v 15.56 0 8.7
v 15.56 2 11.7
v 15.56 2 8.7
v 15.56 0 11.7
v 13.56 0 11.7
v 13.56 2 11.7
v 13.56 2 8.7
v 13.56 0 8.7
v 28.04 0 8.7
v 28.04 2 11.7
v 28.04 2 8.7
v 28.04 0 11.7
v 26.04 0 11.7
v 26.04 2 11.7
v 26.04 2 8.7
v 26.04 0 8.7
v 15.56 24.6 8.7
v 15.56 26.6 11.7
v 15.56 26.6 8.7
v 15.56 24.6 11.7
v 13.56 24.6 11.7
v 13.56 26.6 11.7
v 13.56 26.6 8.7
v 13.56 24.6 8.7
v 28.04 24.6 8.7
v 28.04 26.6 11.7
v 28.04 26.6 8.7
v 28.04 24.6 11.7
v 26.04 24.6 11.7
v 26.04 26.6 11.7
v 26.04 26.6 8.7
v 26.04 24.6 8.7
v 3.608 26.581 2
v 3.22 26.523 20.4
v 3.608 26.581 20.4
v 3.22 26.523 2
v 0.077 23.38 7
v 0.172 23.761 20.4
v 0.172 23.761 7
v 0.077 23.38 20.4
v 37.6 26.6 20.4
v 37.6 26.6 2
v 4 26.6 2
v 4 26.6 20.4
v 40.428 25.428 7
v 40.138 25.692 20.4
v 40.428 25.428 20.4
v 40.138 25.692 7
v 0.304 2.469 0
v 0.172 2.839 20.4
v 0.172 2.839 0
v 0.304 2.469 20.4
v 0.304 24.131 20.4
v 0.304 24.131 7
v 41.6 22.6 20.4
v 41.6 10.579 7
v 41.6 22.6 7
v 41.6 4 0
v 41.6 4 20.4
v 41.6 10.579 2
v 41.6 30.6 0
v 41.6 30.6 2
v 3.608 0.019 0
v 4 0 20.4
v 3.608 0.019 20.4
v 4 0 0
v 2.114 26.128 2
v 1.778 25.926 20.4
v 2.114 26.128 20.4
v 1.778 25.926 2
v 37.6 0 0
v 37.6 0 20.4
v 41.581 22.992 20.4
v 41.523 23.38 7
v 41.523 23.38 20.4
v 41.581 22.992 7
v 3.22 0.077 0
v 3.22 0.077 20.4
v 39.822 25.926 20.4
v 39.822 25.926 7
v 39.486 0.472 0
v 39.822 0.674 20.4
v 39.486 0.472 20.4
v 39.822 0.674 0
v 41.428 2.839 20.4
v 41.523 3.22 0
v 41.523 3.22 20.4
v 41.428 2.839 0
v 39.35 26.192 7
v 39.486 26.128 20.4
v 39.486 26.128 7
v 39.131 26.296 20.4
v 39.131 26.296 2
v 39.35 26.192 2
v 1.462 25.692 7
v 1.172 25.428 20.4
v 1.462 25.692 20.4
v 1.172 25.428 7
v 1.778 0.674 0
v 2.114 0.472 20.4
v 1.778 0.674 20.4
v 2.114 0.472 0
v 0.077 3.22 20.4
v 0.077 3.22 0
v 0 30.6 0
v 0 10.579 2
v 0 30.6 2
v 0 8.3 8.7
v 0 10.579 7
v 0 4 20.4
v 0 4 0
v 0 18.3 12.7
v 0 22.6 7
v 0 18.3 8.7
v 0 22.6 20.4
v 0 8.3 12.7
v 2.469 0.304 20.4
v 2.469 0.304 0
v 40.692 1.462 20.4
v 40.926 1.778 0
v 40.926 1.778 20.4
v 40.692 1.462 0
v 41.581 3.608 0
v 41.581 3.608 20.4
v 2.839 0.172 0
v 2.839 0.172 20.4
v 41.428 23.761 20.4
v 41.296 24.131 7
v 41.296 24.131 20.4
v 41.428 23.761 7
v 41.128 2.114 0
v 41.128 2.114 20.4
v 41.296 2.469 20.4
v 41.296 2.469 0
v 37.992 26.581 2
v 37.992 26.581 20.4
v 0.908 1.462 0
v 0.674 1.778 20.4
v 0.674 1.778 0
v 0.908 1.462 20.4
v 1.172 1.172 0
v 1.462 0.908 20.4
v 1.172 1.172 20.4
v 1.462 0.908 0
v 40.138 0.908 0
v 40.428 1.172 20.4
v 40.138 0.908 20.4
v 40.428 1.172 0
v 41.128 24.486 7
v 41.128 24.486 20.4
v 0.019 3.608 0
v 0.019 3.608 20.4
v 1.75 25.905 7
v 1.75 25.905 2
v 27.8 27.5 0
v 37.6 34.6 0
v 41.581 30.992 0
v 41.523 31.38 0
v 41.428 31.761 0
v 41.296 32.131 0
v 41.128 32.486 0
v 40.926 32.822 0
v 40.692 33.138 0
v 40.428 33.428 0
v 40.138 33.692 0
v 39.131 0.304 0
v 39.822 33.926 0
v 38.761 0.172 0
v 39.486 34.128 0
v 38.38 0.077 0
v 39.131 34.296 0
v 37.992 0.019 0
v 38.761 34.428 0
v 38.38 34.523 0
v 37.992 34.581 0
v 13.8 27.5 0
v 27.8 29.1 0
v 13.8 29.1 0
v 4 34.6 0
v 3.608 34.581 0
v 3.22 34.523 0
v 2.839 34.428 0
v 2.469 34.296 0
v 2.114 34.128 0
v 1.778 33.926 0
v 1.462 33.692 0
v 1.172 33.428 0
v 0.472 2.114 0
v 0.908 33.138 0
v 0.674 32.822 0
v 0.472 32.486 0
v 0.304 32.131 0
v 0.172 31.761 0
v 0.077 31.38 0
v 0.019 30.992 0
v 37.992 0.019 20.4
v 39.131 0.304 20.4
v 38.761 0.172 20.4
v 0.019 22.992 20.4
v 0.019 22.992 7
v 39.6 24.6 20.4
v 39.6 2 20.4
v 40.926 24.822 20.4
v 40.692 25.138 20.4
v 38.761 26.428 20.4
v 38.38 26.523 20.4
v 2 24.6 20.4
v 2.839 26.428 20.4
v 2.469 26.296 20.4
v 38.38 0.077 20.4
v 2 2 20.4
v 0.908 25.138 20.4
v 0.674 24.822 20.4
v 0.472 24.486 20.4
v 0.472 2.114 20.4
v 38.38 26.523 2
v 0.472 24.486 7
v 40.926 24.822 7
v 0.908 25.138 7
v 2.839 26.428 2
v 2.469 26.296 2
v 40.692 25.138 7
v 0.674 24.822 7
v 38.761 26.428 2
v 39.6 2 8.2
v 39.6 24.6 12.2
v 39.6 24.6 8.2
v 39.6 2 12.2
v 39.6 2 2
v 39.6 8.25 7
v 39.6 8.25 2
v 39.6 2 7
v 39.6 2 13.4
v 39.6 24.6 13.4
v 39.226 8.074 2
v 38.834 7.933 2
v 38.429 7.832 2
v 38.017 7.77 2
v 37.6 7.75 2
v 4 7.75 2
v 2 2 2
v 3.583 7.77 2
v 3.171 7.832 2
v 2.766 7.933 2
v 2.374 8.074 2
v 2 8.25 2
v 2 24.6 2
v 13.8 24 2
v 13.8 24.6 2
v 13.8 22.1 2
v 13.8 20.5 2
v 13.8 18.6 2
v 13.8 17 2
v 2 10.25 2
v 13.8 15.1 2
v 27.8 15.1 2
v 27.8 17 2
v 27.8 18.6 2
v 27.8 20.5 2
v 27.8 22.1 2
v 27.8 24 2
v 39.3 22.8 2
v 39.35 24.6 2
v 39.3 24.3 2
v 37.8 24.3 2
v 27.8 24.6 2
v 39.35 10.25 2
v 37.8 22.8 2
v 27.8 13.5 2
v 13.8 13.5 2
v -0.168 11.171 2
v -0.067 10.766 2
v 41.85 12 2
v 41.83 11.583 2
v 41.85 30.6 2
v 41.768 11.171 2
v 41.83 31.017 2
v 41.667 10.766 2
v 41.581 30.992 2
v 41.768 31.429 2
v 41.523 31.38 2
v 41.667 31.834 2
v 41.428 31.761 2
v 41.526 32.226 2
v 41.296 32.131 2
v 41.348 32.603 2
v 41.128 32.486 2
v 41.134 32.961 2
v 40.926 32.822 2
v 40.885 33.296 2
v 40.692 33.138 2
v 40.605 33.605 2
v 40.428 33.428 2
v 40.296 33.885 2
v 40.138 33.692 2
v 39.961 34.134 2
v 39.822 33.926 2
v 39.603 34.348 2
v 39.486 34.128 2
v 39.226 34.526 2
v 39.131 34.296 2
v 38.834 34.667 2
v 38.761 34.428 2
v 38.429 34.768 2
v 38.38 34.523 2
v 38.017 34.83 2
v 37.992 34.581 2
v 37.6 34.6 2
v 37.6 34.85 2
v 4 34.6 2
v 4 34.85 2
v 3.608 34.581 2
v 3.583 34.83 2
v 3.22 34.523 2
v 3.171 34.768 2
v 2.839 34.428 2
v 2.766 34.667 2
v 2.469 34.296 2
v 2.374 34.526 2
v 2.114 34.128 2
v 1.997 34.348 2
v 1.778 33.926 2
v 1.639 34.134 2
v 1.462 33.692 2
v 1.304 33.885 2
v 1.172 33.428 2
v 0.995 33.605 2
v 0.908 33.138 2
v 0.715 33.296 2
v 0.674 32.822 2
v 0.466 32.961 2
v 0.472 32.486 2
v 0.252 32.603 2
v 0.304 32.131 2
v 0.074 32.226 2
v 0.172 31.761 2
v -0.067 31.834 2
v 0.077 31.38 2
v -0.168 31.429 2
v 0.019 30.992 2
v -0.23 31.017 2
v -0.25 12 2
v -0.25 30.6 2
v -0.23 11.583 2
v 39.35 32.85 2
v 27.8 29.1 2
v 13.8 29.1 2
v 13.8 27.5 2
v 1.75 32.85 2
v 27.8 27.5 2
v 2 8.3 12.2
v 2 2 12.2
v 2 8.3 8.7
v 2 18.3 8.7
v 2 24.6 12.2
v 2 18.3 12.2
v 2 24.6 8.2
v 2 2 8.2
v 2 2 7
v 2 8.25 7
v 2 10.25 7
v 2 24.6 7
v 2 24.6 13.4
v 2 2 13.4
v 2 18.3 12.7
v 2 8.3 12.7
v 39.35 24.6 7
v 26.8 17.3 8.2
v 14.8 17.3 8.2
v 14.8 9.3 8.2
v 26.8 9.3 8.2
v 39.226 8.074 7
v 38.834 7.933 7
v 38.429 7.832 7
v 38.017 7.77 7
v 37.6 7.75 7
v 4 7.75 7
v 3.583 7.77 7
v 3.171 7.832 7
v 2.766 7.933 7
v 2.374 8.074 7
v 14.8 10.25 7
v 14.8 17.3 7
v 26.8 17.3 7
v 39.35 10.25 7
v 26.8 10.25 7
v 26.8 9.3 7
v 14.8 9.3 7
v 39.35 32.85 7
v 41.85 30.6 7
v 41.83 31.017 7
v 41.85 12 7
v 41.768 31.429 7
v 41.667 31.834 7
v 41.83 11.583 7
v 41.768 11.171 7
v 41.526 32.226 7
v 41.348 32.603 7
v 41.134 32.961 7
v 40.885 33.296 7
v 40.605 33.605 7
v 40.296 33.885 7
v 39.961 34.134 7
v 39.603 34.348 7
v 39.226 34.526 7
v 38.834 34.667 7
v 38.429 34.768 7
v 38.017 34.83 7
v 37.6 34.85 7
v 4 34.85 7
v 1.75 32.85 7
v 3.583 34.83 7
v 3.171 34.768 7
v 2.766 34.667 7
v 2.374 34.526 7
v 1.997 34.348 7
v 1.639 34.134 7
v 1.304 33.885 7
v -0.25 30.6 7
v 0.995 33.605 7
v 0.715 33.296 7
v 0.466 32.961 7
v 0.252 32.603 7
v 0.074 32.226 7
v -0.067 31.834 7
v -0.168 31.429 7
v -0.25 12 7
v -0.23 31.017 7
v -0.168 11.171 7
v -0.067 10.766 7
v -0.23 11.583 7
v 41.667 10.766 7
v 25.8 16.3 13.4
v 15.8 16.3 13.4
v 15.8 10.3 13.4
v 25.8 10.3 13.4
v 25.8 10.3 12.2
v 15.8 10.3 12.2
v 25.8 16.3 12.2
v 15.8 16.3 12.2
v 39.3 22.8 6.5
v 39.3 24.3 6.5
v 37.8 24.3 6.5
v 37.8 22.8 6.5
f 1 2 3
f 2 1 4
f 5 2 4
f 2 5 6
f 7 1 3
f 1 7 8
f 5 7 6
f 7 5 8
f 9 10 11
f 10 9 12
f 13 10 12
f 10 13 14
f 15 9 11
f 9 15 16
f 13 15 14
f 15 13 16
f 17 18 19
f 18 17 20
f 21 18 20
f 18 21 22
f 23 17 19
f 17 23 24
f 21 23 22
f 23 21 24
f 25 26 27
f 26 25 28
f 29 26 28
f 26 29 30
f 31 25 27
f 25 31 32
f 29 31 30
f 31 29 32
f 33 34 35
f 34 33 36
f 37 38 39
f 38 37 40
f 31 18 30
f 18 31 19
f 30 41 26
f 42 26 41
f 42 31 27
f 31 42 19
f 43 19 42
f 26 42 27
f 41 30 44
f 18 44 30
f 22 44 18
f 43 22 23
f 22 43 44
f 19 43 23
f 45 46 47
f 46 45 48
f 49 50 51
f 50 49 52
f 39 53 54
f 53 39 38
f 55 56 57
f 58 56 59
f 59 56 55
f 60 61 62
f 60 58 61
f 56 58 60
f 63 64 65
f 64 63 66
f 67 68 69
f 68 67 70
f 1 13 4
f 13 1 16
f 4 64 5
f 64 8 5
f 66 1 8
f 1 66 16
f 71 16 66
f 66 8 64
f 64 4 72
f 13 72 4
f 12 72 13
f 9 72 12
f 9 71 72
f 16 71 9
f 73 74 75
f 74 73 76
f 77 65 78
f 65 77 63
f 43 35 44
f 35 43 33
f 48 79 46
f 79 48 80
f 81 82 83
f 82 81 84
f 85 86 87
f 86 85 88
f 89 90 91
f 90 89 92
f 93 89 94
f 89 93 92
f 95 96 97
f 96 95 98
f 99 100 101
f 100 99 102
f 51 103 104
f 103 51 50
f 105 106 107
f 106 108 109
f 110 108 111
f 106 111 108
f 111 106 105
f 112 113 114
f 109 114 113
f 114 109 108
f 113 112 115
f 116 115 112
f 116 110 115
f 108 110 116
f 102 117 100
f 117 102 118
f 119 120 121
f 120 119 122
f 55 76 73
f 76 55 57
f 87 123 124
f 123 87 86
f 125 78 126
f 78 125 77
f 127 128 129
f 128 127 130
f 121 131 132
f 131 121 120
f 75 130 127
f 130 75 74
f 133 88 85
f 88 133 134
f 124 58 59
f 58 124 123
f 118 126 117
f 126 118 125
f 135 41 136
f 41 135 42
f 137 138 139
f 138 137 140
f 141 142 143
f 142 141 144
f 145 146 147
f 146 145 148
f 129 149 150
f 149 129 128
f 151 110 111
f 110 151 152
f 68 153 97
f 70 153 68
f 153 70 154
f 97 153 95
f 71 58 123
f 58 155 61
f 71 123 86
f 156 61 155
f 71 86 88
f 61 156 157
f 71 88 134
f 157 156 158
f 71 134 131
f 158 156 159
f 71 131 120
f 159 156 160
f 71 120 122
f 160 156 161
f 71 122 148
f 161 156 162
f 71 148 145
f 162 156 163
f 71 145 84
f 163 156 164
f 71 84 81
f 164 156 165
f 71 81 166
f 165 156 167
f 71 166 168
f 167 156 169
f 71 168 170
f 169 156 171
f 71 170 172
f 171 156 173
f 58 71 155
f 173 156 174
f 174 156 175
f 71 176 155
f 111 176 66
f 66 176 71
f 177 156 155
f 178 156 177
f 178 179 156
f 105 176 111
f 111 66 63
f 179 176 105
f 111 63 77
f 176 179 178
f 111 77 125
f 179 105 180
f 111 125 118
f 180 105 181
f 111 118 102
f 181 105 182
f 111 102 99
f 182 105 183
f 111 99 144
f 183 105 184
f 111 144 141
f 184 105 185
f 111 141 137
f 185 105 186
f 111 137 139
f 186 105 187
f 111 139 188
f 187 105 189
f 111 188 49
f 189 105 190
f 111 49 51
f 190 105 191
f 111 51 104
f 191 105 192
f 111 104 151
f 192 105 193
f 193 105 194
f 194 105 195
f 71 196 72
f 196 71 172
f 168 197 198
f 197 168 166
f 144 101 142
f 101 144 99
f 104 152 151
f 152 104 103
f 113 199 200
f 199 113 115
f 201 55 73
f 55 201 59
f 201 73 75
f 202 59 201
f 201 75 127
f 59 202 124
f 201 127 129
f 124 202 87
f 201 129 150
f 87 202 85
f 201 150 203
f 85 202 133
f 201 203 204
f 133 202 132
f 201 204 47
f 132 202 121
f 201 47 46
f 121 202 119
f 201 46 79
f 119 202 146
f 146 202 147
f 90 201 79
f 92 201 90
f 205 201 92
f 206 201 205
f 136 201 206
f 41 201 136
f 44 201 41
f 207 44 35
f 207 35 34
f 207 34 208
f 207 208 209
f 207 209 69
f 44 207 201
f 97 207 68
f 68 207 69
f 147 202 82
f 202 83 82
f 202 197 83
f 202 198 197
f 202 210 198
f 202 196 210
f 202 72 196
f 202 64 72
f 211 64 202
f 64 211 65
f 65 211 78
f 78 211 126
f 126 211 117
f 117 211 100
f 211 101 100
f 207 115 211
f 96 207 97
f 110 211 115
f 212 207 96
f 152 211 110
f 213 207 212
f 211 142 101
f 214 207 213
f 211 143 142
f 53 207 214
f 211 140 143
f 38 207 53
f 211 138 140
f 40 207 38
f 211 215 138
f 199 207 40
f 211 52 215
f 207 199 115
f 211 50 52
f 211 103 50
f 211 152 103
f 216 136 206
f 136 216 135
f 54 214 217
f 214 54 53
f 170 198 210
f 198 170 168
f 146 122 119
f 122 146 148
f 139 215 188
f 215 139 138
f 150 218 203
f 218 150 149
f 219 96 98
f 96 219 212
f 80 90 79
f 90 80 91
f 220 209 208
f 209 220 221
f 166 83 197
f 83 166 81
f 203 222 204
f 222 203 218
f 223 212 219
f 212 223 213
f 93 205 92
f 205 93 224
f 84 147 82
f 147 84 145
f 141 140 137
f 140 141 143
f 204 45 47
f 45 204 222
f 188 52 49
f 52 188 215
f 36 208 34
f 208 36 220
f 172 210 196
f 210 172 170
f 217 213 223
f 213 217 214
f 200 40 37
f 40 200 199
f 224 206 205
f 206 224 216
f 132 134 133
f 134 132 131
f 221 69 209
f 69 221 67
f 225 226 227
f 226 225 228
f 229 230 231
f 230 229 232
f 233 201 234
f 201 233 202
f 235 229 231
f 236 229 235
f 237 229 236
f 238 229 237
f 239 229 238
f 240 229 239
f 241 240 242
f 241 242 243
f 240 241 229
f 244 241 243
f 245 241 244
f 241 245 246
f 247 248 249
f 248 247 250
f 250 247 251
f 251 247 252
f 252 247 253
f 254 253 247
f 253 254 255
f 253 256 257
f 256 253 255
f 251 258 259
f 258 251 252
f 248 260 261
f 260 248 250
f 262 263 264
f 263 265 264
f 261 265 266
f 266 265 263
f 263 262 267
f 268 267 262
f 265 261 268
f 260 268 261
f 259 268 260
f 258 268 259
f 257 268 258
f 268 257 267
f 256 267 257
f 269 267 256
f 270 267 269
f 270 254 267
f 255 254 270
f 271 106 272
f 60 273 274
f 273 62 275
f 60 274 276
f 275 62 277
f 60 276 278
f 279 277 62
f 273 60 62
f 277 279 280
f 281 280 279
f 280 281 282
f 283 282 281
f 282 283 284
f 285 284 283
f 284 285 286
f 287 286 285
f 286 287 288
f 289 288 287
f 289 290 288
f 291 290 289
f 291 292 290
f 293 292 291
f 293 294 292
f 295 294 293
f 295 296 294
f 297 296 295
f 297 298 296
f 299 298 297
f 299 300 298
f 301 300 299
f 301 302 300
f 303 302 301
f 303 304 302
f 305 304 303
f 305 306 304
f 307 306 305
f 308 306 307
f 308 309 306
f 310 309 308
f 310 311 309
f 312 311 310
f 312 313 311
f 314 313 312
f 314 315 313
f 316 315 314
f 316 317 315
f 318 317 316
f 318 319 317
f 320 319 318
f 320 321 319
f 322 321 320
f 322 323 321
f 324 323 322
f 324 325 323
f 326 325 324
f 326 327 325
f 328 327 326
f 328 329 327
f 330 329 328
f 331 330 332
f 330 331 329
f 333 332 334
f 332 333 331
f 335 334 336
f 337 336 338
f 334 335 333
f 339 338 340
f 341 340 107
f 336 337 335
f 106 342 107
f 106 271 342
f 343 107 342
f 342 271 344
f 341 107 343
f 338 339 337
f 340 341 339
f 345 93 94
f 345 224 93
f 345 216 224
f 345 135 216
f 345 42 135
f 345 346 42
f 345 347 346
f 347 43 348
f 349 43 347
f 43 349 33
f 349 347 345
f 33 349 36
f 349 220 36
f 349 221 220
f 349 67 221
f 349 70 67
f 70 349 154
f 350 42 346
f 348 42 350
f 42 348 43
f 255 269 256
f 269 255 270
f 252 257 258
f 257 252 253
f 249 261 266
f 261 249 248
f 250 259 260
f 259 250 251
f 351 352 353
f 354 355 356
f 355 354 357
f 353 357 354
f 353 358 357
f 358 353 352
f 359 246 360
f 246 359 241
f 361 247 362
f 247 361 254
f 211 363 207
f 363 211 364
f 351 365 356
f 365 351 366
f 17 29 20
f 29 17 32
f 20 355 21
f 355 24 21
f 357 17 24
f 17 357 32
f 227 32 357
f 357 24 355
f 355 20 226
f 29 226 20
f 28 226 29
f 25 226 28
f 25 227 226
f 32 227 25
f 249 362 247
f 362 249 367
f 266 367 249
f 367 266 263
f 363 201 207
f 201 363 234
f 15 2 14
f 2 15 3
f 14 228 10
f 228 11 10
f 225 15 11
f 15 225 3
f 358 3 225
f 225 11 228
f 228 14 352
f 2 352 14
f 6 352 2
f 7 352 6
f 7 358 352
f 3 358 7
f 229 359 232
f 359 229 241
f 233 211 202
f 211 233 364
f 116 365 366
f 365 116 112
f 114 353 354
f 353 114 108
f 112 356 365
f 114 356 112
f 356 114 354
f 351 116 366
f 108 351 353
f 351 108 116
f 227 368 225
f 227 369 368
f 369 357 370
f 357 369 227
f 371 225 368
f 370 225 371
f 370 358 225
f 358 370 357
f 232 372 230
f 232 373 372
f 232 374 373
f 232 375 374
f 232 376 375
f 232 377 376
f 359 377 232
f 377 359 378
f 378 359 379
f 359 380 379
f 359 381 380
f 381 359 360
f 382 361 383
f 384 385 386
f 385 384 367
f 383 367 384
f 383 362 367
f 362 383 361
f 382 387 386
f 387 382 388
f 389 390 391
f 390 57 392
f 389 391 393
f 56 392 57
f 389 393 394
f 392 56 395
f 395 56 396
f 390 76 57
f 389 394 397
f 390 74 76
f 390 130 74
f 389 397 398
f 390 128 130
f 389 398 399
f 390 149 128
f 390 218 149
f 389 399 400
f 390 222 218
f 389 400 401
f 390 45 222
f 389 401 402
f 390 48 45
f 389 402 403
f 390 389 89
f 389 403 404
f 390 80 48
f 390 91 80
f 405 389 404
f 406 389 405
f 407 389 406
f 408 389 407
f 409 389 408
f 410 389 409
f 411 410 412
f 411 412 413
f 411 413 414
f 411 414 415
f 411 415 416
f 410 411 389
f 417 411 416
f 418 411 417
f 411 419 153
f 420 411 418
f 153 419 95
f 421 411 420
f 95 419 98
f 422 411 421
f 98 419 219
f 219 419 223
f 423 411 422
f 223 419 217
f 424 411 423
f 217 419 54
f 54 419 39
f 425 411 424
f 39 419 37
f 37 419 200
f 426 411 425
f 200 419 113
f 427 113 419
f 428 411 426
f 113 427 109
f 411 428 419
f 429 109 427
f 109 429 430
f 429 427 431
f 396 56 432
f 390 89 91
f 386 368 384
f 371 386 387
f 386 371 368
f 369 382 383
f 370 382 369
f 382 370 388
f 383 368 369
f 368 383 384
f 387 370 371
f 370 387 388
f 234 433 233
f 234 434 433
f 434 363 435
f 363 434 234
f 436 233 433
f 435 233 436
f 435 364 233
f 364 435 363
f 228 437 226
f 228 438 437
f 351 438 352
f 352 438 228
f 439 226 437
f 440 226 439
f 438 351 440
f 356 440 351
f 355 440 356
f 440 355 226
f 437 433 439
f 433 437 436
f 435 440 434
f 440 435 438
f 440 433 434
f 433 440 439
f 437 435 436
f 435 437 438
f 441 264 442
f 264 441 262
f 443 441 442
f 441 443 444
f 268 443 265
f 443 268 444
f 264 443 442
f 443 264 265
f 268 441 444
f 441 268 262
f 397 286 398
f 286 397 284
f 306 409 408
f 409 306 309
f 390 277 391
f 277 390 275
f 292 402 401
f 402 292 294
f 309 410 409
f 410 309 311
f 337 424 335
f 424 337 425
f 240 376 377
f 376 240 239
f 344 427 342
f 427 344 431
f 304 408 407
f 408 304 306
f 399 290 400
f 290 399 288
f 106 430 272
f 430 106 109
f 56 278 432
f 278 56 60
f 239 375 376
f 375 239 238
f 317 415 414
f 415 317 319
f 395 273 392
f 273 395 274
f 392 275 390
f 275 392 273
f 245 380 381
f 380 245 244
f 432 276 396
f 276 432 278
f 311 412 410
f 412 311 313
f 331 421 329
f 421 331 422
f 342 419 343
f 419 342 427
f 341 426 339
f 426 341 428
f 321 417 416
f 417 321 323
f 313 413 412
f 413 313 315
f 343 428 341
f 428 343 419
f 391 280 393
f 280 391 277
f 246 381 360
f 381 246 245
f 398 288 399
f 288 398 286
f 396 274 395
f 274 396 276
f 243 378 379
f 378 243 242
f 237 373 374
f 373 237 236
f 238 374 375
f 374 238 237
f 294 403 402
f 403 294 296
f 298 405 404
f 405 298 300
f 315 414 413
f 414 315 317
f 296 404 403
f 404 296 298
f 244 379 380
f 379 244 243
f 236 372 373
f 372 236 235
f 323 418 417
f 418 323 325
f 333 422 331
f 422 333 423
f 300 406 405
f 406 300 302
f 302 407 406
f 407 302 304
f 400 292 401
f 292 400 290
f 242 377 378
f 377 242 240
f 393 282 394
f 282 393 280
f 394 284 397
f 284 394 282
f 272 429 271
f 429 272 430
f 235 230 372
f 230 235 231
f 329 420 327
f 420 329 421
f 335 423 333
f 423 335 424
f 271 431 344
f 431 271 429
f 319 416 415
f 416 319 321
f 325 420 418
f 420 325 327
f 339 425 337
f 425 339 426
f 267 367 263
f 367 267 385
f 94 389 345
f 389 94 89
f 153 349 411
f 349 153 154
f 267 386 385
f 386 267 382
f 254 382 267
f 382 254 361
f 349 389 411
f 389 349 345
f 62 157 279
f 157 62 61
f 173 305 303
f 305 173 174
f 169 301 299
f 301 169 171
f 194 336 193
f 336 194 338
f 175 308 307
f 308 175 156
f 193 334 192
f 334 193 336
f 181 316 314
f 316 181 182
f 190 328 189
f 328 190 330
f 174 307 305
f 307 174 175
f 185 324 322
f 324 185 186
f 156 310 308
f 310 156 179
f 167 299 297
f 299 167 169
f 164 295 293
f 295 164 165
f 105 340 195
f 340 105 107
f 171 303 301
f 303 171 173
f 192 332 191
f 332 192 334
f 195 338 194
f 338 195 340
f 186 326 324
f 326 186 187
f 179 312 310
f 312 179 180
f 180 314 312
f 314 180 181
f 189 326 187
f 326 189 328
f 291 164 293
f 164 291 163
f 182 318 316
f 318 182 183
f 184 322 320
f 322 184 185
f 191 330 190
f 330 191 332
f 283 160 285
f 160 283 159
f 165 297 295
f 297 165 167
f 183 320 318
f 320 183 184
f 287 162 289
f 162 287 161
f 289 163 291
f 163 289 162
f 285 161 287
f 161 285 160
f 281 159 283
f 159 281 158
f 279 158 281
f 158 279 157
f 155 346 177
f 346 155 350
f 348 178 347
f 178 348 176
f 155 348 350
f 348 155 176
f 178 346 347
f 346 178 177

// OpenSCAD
/*
 * Zigbee CO2 Sensor Enclosure
 * ───────────────────────────────────────────────────────────────────────────
 * Components (L × W × H):
 *   LiPo 502035p        : 35.0 × 20.0 × 5.0 mm  — bottom layer
 *   ESP32-C6 SuperMini  : 26.15 × 17.5 × 4.0 mm  — middle layer (USB-C on short end)
 *   SCD-41 breakout     : 21.6 × 13.4 × 5.0 mm  — top layer (ventilated lid)
 *
 * Stacking (Z, bottom → top):
 *   wall(2) / LiPo(5) / shelf(1.2) / ESP(4) / shelf(1.2) / SCD41(5) / clearance(2) / lid
 *
 * USB-C port faces the FRONT wall (short face of the enclosure).
 * SCD-41 ventilation slots are in the lid top plate.
 *
 * How to print:
 *   1. Open in OpenSCAD (openscad.org, free)
 *   2. F6 → Render, then File → Export → STL
 *   3. Print BODY and LID separately (no supports needed — both lay flat)
 *   4. Adjust TOL if fit is too tight / too loose
 *
 * Coordinate convention:
 *   X — along enclosure LENGTH  (LiPo long axis, ~42 mm)
 *   Y — along enclosure WIDTH   (LiPo short axis, ~26 mm)
 *   Z — vertical (height,       ~21 mm)
 *   Front face (USB-C cutout) is at X = 0.
 */

$fn = 64;

// ═══════════════════════════════════════════════════════
//  PARAMETERS — tweak these to adjust the model
// ═══════════════════════════════════════════════════════

WALL      = 2.0;    // wall thickness (mm)
R_OUTER   = 4.0;   // outer corner radius — controls how "rounded" corners look
TOL       = 0.3;   // clearance added around each component (per side)

// LiPo battery
BAT_L = 35.0;  BAT_W = 20.0;  BAT_H = 5.0;

// ESP32-C6 SuperMini
ESP_L = 26.15; ESP_W = 17.5;  ESP_H = 4.0;
USB_C_EXT = 1.35;  // how far USB-C plug extends beyond PCB edge

// SCD-41 breakout module
SCD_L = 21.6;  SCD_W = 13.4;  SCD_H = 5.0;

// Internal shelves between layers
SHELF_H = 1.2;

// Air gap above SCD-41 before lid seals
TOP_CLR = 2.0;

// USB-C port cutout size
USB_CUT_W = 10.0;   // width of opening
USB_CUT_H =  4.0;   // height of opening

// Lid parameters
LID_TOP_T   = 2.0;  // lid top plate thickness
LID_RIM_H   = 5.0;  // rim height (overlaps outside of body)
LID_FIT     = 0.25; // clearance between lid rim inner and body outer (per side)

// Ventilation grid in lid (over SCD-41)
VENT_SLOT_L = 14.0;
VENT_SLOT_W =  1.6;
VENT_SLOTS  =  5;
VENT_PITCH  =  3.5;

// ═══════════════════════════════════════════════════════
//  DERIVED DIMENSIONS (do not edit unless you know why)
// ═══════════════════════════════════════════════════════

// Inner cavity — large enough for every component + tolerance
IN_L = max(BAT_L, ESP_L, SCD_L) + 2*TOL + 2.0;   // ~37.6 mm
IN_W = max(BAT_W, ESP_W, SCD_W) + 2*TOL + 2.0;   // ~22.6 mm
IN_H = BAT_H + SHELF_H + ESP_H + SHELF_H + SCD_H + TOP_CLR; // ~18.4 mm

// Body outer
BODY_L = IN_L + 2*WALL;  // ~41.6 mm
BODY_W = IN_W + 2*WALL;  // ~26.6 mm
BODY_H = IN_H + WALL;    // ~20.4 mm (closed bottom, open top)

// Z positions of layer floors (inside body, above bottom wall)
Z_SHELF1 = WALL + BAT_H;                          // top of LiPo
Z_SHELF2 = Z_SHELF1 + SHELF_H + ESP_H;            // top of ESP
Z_SCD    = Z_SHELF2 + SHELF_H;                    // SCD-41 floor
Z_USB    = Z_SHELF1 + SHELF_H + 0.5;              // center of USB-C cutout


// ═══════════════════════════════════════════════════════
//  HELPER MODULES
// ═══════════════════════════════════════════════════════

// Rounded rectangular prism aligned to origin
module rounded_box(l, w, h, r) {
    hull()
        for (dx = [r, l-r], dy = [r, w-r])
            translate([dx, dy, 0])
                cylinder(r=r, h=h);
}

// Centered slot (for ventilation openings)
module slot(l, w, h) {
    translate([-l/2, -w/2, 0])
        cube([l, w, h]);
}


// ═══════════════════════════════════════════════════════
//  BODY
// ═══════════════════════════════════════════════════════

module body() {
    difference() {
        // ── Outer shell ──────────────────────────────────────────────────────
        rounded_box(BODY_L, BODY_W, BODY_H, R_OUTER);

        // ── Main inner cavity (open top) ─────────────────────────────────────
        translate([WALL, WALL, WALL])
            cube([IN_L, IN_W, IN_H + 0.1]);

        // ── USB-C cutout (front face at X=0, centered on Y) ──────────────────
        //    The ESP is positioned against the front wall so the USB port lines up.
        translate([-0.1,
                   (BODY_W - USB_CUT_W) / 2,
                   Z_USB])
            cube([WALL + 0.2, USB_CUT_W, USB_CUT_H]);

        // ── Side ventilation slots (2 slots per long side, ESP level) ─────────
        //    Helps air circulation and cable routing
        for (side_y = [0, BODY_W - WALL])
            for (slot_x = [BODY_L * 0.35, BODY_L * 0.65])
                translate([slot_x - 1.0, side_y - 0.1, Z_SHELF1 + SHELF_H + 0.5])
                    cube([2.0, WALL + 0.2, 3.0]);
    }

    // ── Shelf 1: above LiPo, below ESP ───────────────────────────────────────
    translate([WALL, WALL, Z_SHELF1]) {
        difference() {
            cube([IN_L, IN_W, SHELF_H]);
            // Wire / connector pass-through (centered)
            translate([IN_L/2 - 6, IN_W/2 - 4, -0.1])
                cube([12, 8, SHELF_H + 0.2]);
        }
    }

    // ── Shelf 2: above ESP, below SCD-41 ─────────────────────────────────────
    translate([WALL, WALL, Z_SHELF2]) {
        difference() {
            cube([IN_L, IN_W, SHELF_H]);
            // Wire pass-through (smaller — only I2C wires)
            translate([IN_L/2 - 5, IN_W/2 - 3, -0.1])
                cube([10, 6, SHELF_H + 0.2]);
        }
    }

    // ── Locating peg for LiPo (rear corner, keeps battery from sliding) ──────
    translate([WALL + IN_L - 1.5 - TOL, WALL + IN_W - 1.5 - TOL, WALL])
        cube([1.5, 1.5, BAT_H - 0.5]);
}


// ═══════════════════════════════════════════════════════
//  LID
// ═══════════════════════════════════════════════════════

module lid() {
    // The lid sits on top of the body.
    // Origin is the OUTER BOTTOM of the lid top plate.
    // When printing: flip upside-down (rotate [180,0,0]) so the rim points up.

    cx = BODY_L / 2;
    cy = BODY_W / 2;

    difference() {
        union() {
            // Top plate
            rounded_box(BODY_L, BODY_W, LID_TOP_T, R_OUTER);

            // Rim — slides over the outside of the body
            translate([-LID_FIT, -LID_FIT, -LID_RIM_H])
                difference() {
                    rounded_box(BODY_L + 2*LID_FIT,
                                BODY_W + 2*LID_FIT,
                                LID_RIM_H,
                                R_OUTER + LID_FIT);
                    // Hollow interior of rim (body fits inside)
                    translate([WALL, WALL, -0.1])
                        cube([IN_L, IN_W, LID_RIM_H + 0.2]);
                }
        }

        // ── Ventilation grid (centered in lid, over SCD-41 area) ─────────────
        total_span = (VENT_SLOTS - 1) * VENT_PITCH;
        for (i = [0 : VENT_SLOTS - 1])
            translate([cx,
                       cy - total_span/2 + i * VENT_PITCH,
                       -0.1])
                slot(VENT_SLOT_L, VENT_SLOT_W, LID_TOP_T + 0.2);

        // ── Label recess (optional — for a small label / engraving) ──────────
        // translate([cx - 8, cy + total_span/2 + 3, LID_TOP_T - 0.4])
        //     cube([16, 4, 0.5]);
    }
}


// ═══════════════════════════════════════════════════════
//  RENDER
//  Both parts shown side-by-side for preview.
//  When exporting STL: comment out the other part.
// ═══════════════════════════════════════════════════════

// BODY (print as-is, flat bottom down)
body();

// LID (shown flipped for printing — flat side will be print bed)
translate([0, BODY_W + 8, LID_TOP_T])
    rotate([180, 0, 0])
        lid();


// ═══════════════════════════════════════════════════════
//  COMPONENT PREVIEW (comment out before exporting STL)
//  Uncomment to visualise component placement inside body
// ═══════════════════════════════════════════════════════

//SHOW_COMPONENTS = true;   // set to false to hide
//if (SHOW_COMPONENTS) {
//    color("SteelBlue", 0.7)  // LiPo
//        translate([WALL + (IN_L - BAT_L)/2,
//                   WALL + (IN_W - BAT_W)/2,
//                   WALL])
//            cube([BAT_L, BAT_W, BAT_H]);
//
//    color("Green", 0.8)      // ESP32-C6 SuperMini
//        translate([WALL,
//                   WALL + (IN_W - ESP_W)/2,
//                   Z_SHELF1 + SHELF_H])
//            cube([ESP_L, ESP_W, ESP_H]);
//
//    color("OrangeRed", 0.8)  // SCD-41
//        translate([WALL + (IN_L - SCD_L)/2,
//                   WALL + (IN_W - SCD_W)/2,
//                   Z_SCD])
//            cube([SCD_L, SCD_W, SCD_H]);
//}
